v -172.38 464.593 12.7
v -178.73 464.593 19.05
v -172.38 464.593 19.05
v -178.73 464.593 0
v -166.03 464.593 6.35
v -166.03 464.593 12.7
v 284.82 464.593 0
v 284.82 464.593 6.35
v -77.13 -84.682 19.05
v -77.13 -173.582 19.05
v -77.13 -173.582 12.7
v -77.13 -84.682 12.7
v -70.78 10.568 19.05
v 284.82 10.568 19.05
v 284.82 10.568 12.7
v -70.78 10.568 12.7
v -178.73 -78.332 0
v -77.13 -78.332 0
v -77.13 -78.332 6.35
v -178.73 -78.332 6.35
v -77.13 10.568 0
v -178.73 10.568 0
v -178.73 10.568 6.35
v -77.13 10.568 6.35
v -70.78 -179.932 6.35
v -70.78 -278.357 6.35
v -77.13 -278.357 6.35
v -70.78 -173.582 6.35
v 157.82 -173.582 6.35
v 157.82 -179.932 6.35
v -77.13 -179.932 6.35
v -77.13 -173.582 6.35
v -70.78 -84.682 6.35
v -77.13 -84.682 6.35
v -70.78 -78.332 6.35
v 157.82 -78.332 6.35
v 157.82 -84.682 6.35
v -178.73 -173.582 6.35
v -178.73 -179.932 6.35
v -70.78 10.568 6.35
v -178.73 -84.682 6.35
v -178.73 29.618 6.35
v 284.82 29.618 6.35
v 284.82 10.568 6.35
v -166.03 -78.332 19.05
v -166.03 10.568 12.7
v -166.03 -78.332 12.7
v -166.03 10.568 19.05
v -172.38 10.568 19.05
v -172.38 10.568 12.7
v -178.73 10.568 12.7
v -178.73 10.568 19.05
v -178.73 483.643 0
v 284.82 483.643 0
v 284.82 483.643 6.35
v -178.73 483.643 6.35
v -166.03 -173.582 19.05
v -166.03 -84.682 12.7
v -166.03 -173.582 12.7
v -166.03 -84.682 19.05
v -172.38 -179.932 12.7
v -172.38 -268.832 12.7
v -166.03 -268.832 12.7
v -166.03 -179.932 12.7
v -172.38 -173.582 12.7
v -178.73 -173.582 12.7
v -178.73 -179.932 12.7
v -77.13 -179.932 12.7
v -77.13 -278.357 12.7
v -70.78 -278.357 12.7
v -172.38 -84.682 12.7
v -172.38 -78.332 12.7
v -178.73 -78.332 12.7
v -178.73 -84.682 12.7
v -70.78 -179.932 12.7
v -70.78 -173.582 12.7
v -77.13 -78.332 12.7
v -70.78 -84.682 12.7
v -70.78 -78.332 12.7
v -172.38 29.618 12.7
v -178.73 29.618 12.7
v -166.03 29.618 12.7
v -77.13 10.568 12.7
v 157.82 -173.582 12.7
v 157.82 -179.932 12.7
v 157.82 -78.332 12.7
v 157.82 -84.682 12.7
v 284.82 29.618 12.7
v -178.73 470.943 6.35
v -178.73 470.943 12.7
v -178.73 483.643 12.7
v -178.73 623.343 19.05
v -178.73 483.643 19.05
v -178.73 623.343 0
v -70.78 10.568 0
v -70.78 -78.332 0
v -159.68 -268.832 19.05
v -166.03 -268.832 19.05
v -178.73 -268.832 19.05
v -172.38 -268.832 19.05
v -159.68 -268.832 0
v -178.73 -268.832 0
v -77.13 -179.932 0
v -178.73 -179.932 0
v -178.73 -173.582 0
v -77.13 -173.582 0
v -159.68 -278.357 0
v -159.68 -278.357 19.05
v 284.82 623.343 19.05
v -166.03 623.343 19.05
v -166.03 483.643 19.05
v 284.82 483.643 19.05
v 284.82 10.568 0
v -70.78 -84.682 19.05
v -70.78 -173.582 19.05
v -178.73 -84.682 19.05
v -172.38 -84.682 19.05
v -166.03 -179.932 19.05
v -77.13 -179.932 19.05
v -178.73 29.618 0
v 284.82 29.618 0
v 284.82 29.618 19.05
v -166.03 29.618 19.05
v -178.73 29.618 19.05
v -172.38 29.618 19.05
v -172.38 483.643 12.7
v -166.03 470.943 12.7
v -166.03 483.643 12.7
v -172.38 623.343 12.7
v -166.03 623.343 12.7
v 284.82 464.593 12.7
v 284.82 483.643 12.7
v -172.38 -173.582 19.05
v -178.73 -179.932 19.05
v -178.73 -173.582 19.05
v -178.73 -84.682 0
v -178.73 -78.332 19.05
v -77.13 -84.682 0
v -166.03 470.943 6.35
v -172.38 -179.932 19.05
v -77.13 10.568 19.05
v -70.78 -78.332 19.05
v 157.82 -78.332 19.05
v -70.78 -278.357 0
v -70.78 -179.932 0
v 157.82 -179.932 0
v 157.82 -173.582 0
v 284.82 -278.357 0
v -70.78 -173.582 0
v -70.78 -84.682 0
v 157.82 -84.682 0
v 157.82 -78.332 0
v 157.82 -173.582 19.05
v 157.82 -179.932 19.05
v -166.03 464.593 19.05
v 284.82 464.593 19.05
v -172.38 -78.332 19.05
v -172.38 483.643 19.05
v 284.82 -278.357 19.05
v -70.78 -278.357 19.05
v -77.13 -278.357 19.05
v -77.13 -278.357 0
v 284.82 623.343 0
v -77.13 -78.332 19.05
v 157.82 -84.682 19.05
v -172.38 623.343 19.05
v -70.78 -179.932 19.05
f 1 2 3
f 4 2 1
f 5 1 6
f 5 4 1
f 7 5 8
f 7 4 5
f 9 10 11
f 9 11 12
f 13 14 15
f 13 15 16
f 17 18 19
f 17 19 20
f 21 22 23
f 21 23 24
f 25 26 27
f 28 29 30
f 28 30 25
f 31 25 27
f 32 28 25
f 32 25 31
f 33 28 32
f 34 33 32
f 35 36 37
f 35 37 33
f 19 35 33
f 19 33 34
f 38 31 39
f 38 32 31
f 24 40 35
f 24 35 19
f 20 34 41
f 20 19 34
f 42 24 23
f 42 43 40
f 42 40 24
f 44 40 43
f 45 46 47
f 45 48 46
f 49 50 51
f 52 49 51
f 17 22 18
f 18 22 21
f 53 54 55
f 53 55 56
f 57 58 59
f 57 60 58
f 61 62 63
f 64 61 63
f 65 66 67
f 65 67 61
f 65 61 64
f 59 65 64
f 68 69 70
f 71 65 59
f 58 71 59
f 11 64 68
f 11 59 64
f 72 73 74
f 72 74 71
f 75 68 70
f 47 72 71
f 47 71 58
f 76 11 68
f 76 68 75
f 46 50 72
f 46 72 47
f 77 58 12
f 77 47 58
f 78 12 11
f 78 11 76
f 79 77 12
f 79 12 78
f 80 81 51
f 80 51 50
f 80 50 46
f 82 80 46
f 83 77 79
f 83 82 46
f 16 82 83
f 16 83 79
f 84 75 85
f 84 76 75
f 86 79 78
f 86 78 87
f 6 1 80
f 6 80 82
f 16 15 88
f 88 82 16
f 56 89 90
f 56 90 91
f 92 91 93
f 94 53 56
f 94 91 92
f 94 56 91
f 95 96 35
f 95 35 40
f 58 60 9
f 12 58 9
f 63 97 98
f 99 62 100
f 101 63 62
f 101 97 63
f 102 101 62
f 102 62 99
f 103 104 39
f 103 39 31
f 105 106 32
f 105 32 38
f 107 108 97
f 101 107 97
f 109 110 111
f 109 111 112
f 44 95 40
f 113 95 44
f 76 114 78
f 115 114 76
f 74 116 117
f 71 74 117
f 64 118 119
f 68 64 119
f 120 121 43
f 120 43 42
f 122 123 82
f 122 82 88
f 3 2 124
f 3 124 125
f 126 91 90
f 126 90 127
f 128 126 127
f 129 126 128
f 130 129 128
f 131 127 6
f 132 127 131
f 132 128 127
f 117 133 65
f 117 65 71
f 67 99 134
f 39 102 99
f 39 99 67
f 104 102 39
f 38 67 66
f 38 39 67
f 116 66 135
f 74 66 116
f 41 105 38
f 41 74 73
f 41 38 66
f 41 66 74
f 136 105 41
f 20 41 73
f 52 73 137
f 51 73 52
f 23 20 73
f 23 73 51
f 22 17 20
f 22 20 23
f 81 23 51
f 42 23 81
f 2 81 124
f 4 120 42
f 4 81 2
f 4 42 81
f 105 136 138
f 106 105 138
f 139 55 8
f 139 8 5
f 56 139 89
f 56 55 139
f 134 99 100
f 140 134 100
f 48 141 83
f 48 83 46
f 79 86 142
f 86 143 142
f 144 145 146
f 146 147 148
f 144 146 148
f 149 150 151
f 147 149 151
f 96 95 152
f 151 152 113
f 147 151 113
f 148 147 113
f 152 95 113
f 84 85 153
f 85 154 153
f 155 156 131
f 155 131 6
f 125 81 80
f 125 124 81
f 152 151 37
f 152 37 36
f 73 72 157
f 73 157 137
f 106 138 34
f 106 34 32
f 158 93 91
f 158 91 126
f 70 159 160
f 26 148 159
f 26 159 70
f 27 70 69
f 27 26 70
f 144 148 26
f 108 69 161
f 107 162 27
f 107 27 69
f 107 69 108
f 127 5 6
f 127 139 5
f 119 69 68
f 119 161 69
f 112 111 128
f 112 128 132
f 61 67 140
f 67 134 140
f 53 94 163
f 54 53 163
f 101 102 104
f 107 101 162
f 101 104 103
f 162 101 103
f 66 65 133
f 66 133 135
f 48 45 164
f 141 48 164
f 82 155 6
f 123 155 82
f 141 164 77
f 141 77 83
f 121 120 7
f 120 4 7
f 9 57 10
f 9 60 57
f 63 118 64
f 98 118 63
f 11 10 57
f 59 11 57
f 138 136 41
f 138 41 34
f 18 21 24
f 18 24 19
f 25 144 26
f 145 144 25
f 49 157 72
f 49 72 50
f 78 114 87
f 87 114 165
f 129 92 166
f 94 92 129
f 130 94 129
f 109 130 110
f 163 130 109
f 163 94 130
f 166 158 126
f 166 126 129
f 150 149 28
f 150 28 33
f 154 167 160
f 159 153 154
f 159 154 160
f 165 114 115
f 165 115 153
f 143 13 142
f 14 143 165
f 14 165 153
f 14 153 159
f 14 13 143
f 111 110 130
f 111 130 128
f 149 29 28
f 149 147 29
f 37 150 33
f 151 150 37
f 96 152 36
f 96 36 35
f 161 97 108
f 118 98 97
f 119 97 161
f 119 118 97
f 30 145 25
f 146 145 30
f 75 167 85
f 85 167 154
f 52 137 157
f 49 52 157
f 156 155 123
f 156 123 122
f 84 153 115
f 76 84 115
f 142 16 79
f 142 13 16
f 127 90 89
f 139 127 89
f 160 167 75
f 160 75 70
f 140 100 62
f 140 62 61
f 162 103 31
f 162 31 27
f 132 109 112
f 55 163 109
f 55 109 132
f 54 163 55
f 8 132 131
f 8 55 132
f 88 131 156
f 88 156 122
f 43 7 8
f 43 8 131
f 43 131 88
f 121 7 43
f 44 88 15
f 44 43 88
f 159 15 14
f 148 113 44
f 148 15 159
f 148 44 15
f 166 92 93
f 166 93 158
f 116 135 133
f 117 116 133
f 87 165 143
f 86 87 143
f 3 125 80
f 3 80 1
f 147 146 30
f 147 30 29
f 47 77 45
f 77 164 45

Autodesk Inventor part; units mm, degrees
ref_plane "YZ Plane" through (0, 0, 0) normal (1, 0, 0) x (0, 1, 0)
ref_plane "XZ Plane" through (0, 0, 0) normal (0, 1, 0) x (-1, 0, 0)
ref_plane "XY Plane" through (0, 0, 0) normal (0, 0, 1) x (1, 0, 0)
sketch "Sketch1" plane through (0, 0, 0) normal (0, 0, 1) x (1, 0, 0)
  line L0 (-178.7298, 623.3432) -> (284.8202, 623.3432)
  line L1 (284.8202, 623.3432) -> (284.8202, -278.3568)
  line L2 (284.8202, -278.3568) -> (-178.7298, -278.3568)
  line L3 (-178.7298, -278.3568) -> (-178.7298, 623.3432)
  point P0 (0, 0)
  dimension "d0" = 901.7
  dimension "d1" = 463.55
extrude "Board" add sketch "Sketch1" along normal blind 19.05
sketch "Sketch6" plane through (0, 0, 0) normal (0, 0, -1) x (-1, 0, 0)
  line L0 (-284.8202, 483.6432) -> (178.7298, 483.6432)
  line L1 (178.7298, 483.6432) -> (178.7298, 464.5932)
  line L2 (178.7298, 464.5932) -> (-284.8202, 464.5932)
  line L3 (-284.8202, 464.5932) -> (-284.8202, 483.6432)
  line L4 (178.7298, 623.3432) -> (-284.8202, 623.3432) projected
  line L5 (178.7298, -278.3568) -> (178.7298, 623.3432) projected
  line L6 (-284.8202, 623.3432) -> (-284.8202, -278.3568) projected
  line L7 (-284.8202, 29.6182) -> (178.7298, 29.6182)
  line L8 (178.7298, 29.6182) -> (178.7298, 10.5682)
  line L9 (178.7298, 10.5682) -> (-284.8202, 10.5682)
  line L10 (-284.8202, 10.5682) -> (-284.8202, 29.6182)
  point P0 (0, 0)
  dimension "d30" = 19.05
  dimension "d37" = 434.975
  dimension "d119" = 139.7
extrude "Right Shelf Dados" cut sketch "Sketch6" against normal blind 6.35 contours L0 L1 L2 L3 | L7 L5 L9 L6
sketch "Sketch32" plane through (0, 0, 0) normal (0, 0, -1) x (-1, 0, 0)
  line L0 (-157.8202, -78.3318) -> (178.7298, -78.3318)
  line L1 (178.7298, -78.3318) -> (178.7298, -84.6818)
  line L2 (178.7298, -84.6818) -> (-157.8202, -84.6818)
  line L3 (-157.8202, -84.6818) -> (-157.8202, -78.3318)
  line L4 (-157.8202, -173.5818) -> (178.7298, -173.5818)
  line L5 (178.7298, -173.5818) -> (178.7298, -179.9318)
  line L6 (178.7298, -179.9318) -> (-157.8202, -179.9318)
  line L7 (-157.8202, -179.9318) -> (-157.8202, -173.5818)
  line L8 (-284.8202, 623.3432) -> (-284.8202, -278.3568) projected
  line L9 (178.7298, 623.3432) -> (178.7298, -278.3568) projected
  line L10 (-284.8202, -278.3568) -> (178.7298, -278.3568) projected
  point P0 (0, 0)
  point P1 (-284.8202, 10.5682)
  dimension "d142" = 88.9
  dimension "d143" = 6.35
  dimension "d146" = 336.55
  dimension "d167" = 127
  dimension "d170" = 98.425
extrude "Right Wine Rack Horizonal Dados" cut sketch "Sketch32" against normal blind 6.35
sketch "Sketch33" plane through (0, 0, 0) normal (0, 0, -1) x (-1, 0, 0)
  line L0 (178.7298, 10.5682) -> (-284.8202, 10.5682) projected
  line L1 (70.7798, 10.5682) -> (77.1298, 10.5682)
  line L2 (77.1298, 10.5682) -> (77.1298, -278.3568)
  line L3 (77.1298, -278.3568) -> (70.7798, -278.3568)
  line L4 (70.7798, -278.3568) -> (70.7798, 10.5682)
  line L5 (-157.8202, -84.6818) -> (-157.8202, -78.3318) projected
  line L6 (-284.8202, -278.3568) -> (178.7298, -278.3568) projected
  point P0 (0, 0)
  dimension "d149" = 6.35
  dimension "d168" = 228.6
extrude "Right Wine Rack Vertical Dado" cut sketch "Sketch33" against normal blind 6.35
sketch "Sketch7" plane through (0, 0, 19.05) normal (0, 0, 1) x (1, 0, 0)
  line L0 (-178.7298, 483.6432) -> (284.8202, 483.6432)
  line L1 (284.8202, 483.6432) -> (284.8202, 464.5932)
  line L2 (284.8202, 464.5932) -> (-178.7298, 464.5932)
  line L3 (-178.7298, 464.5932) -> (-178.7298, 483.6432)
  line L4 (284.8202, 483.6432) -> (-178.7298, 483.6432) projected
  line L5 (-178.7298, 464.5932) -> (284.8202, 464.5932) projected
  line L6 (284.8202, -278.3568) -> (284.8202, 623.3432) projected
  line L7 (-178.7298, 623.3432) -> (-178.7298, -278.3568) projected
  line L8 (-178.7298, 29.6182) -> (284.8202, 29.6182)
  line L9 (284.8202, 29.6182) -> (284.8202, 10.5682)
  line L10 (284.8202, 10.5682) -> (-178.7298, 10.5682)
  line L11 (-178.7298, 10.5682) -> (-178.7298, 29.6182)
  point P0 (0, 0)
  point P1 (284.8202, 20.0932)
  dimension "d36" = 434.975
extrude "Left Shelf Dados" cut sketch "Sketch7" against normal blind 6.35 contours L0 L1 L2 L3 | L8 L6 L10 L7
sketch "Sketch34" plane through (0, 0, 19.05) normal (0, 0, 1) x (1, 0, 0)
  line L0 (157.8202, -78.3318) -> (-178.7298, -78.3318)
  line L1 (-178.7298, -78.3318) -> (-178.7298, -84.6818)
  line L2 (-178.7298, -84.6818) -> (157.8202, -84.6818)
  line L3 (157.8202, -84.6818) -> (157.8202, -78.3318)
  line L4 (157.8202, -173.5818) -> (-178.7298, -173.5818)
  line L5 (-178.7298, -173.5818) -> (-178.7298, -179.9318)
  line L6 (-178.7298, -179.9318) -> (157.8202, -179.9318)
  line L7 (157.8202, -179.9318) -> (157.8202, -173.5818)
  line L8 (284.8202, -278.3568) -> (284.8202, 10.5682) projected
  line L9 (-178.7298, 10.5682) -> (-178.7298, 483.6432) projected
  line L10 (-178.7298, -278.3568) -> (284.8202, -278.3568) projected
  point P0 (0, 0)
  dimension "d153" = 6.35
  dimension "d155" = 88.9
  dimension "d164" = 127
  dimension "d171" = 98.425
extrude "Left Wine Rack Horizontal Dados" cut sketch "Sketch34" against normal blind 6.35
sketch "Sketch35" plane through (0, 0, 19.05) normal (0, 0, 1) x (1, 0, 0)
  line L0 (284.8202, 10.5682) -> (-178.7298, 10.5682) projected
  line L1 (-77.1298, 10.5682) -> (-70.7798, 10.5682)
  line L2 (-70.7798, 10.5682) -> (-70.7798, -278.3568)
  line L3 (-70.7798, -278.3568) -> (-77.1298, -278.3568)
  line L4 (-77.1298, -278.3568) -> (-77.1298, 10.5682)
  line L5 (157.8202, -78.3318) -> (157.8202, -84.6818) projected
  line L6 (-178.7298, -278.3568) -> (284.8202, -278.3568) projected
  point P0 (0, 0)
  dimension "d159" = 6.35
  dimension "d165" = 228.6
extrude "Left Wine Rack  Vertical Dado" cut sketch "Sketch35" against normal blind 6.35
sketch "Sketch10" plane through (0, 0, 19.05) normal (0, 0, 1) x (1, 0, 0)
  line L0 (284.8202, -278.3568) -> (-178.7298, -278.3568) projected
  line L1 (-172.3798, 623.3432) -> (-166.0298, 623.3432)
  line L2 (-166.0298, 623.3432) -> (-166.0298, -278.3568)
  line L3 (-166.0298, -278.3568) -> (-172.3798, -278.3568)
  line L4 (-172.3798, -278.3568) -> (-172.3798, 623.3432)
  line L5 (-178.7298, 464.5932) -> (-178.7298, 29.6182) projected
  line L6 (284.8202, 623.3432) -> (-178.7298, 623.3432) projected
  point P0 (0, 0)
  point P1 (-172.3798, -278.3568)
  dimension "d172" = 6.35
  dimension "d173" = 6.35
extrude "Vertical Wire Channel" cut sketch "Sketch10" against normal blind 6.35
sketch "Sketch12" plane through (-178.7298, -278.3568, 12.7) normal (-1, 0, 0) x (0, 0, 1)
  line L0 (-6.35, 742.95) -> (0, 742.95)
  line L1 (0, 742.95) -> (0, 749.3)
  line L2 (0, 749.3) -> (-6.35, 749.3)
  line L3 (-6.35, 749.3) -> (-6.35, 742.95)
  line L4 (0, 288.925) -> (0, 307.975) projected
  line L5 (-6.35, 742.95) -> (-12.7, 742.95) projected
  point P0 (0, 0)
  point P1 (0, 901.7)
  dimension "d51" = 6.35
extrude "Top Horizontal Wire Channel" cut sketch "Sketch12" against normal blind 12.7
sketch "Sketch36" plane through (0, 0, 0) normal (0, 0, -1) x (-1, 0, 0)
  line L0 (77.1298, -278.3568) -> (178.7298, -278.3568) projected
  line L1 (178.7298, -278.3568) -> (159.6798, -278.3568)
  line L2 (159.6798, -278.3568) -> (159.6798, -268.8318)
  line L3 (159.6798, -268.8318) -> (178.7298, -268.8318)
  line L4 (178.7298, -268.8318) -> (178.7298, -278.3568)
  point P0 (0, 0)
  dimension "d174" = 19.05
  dimension "d175" = 9.525
extrude "Extrusion33" cut sketch "Sketch36" against normal blind 19.05
properties part number "Vertical Shelf"
